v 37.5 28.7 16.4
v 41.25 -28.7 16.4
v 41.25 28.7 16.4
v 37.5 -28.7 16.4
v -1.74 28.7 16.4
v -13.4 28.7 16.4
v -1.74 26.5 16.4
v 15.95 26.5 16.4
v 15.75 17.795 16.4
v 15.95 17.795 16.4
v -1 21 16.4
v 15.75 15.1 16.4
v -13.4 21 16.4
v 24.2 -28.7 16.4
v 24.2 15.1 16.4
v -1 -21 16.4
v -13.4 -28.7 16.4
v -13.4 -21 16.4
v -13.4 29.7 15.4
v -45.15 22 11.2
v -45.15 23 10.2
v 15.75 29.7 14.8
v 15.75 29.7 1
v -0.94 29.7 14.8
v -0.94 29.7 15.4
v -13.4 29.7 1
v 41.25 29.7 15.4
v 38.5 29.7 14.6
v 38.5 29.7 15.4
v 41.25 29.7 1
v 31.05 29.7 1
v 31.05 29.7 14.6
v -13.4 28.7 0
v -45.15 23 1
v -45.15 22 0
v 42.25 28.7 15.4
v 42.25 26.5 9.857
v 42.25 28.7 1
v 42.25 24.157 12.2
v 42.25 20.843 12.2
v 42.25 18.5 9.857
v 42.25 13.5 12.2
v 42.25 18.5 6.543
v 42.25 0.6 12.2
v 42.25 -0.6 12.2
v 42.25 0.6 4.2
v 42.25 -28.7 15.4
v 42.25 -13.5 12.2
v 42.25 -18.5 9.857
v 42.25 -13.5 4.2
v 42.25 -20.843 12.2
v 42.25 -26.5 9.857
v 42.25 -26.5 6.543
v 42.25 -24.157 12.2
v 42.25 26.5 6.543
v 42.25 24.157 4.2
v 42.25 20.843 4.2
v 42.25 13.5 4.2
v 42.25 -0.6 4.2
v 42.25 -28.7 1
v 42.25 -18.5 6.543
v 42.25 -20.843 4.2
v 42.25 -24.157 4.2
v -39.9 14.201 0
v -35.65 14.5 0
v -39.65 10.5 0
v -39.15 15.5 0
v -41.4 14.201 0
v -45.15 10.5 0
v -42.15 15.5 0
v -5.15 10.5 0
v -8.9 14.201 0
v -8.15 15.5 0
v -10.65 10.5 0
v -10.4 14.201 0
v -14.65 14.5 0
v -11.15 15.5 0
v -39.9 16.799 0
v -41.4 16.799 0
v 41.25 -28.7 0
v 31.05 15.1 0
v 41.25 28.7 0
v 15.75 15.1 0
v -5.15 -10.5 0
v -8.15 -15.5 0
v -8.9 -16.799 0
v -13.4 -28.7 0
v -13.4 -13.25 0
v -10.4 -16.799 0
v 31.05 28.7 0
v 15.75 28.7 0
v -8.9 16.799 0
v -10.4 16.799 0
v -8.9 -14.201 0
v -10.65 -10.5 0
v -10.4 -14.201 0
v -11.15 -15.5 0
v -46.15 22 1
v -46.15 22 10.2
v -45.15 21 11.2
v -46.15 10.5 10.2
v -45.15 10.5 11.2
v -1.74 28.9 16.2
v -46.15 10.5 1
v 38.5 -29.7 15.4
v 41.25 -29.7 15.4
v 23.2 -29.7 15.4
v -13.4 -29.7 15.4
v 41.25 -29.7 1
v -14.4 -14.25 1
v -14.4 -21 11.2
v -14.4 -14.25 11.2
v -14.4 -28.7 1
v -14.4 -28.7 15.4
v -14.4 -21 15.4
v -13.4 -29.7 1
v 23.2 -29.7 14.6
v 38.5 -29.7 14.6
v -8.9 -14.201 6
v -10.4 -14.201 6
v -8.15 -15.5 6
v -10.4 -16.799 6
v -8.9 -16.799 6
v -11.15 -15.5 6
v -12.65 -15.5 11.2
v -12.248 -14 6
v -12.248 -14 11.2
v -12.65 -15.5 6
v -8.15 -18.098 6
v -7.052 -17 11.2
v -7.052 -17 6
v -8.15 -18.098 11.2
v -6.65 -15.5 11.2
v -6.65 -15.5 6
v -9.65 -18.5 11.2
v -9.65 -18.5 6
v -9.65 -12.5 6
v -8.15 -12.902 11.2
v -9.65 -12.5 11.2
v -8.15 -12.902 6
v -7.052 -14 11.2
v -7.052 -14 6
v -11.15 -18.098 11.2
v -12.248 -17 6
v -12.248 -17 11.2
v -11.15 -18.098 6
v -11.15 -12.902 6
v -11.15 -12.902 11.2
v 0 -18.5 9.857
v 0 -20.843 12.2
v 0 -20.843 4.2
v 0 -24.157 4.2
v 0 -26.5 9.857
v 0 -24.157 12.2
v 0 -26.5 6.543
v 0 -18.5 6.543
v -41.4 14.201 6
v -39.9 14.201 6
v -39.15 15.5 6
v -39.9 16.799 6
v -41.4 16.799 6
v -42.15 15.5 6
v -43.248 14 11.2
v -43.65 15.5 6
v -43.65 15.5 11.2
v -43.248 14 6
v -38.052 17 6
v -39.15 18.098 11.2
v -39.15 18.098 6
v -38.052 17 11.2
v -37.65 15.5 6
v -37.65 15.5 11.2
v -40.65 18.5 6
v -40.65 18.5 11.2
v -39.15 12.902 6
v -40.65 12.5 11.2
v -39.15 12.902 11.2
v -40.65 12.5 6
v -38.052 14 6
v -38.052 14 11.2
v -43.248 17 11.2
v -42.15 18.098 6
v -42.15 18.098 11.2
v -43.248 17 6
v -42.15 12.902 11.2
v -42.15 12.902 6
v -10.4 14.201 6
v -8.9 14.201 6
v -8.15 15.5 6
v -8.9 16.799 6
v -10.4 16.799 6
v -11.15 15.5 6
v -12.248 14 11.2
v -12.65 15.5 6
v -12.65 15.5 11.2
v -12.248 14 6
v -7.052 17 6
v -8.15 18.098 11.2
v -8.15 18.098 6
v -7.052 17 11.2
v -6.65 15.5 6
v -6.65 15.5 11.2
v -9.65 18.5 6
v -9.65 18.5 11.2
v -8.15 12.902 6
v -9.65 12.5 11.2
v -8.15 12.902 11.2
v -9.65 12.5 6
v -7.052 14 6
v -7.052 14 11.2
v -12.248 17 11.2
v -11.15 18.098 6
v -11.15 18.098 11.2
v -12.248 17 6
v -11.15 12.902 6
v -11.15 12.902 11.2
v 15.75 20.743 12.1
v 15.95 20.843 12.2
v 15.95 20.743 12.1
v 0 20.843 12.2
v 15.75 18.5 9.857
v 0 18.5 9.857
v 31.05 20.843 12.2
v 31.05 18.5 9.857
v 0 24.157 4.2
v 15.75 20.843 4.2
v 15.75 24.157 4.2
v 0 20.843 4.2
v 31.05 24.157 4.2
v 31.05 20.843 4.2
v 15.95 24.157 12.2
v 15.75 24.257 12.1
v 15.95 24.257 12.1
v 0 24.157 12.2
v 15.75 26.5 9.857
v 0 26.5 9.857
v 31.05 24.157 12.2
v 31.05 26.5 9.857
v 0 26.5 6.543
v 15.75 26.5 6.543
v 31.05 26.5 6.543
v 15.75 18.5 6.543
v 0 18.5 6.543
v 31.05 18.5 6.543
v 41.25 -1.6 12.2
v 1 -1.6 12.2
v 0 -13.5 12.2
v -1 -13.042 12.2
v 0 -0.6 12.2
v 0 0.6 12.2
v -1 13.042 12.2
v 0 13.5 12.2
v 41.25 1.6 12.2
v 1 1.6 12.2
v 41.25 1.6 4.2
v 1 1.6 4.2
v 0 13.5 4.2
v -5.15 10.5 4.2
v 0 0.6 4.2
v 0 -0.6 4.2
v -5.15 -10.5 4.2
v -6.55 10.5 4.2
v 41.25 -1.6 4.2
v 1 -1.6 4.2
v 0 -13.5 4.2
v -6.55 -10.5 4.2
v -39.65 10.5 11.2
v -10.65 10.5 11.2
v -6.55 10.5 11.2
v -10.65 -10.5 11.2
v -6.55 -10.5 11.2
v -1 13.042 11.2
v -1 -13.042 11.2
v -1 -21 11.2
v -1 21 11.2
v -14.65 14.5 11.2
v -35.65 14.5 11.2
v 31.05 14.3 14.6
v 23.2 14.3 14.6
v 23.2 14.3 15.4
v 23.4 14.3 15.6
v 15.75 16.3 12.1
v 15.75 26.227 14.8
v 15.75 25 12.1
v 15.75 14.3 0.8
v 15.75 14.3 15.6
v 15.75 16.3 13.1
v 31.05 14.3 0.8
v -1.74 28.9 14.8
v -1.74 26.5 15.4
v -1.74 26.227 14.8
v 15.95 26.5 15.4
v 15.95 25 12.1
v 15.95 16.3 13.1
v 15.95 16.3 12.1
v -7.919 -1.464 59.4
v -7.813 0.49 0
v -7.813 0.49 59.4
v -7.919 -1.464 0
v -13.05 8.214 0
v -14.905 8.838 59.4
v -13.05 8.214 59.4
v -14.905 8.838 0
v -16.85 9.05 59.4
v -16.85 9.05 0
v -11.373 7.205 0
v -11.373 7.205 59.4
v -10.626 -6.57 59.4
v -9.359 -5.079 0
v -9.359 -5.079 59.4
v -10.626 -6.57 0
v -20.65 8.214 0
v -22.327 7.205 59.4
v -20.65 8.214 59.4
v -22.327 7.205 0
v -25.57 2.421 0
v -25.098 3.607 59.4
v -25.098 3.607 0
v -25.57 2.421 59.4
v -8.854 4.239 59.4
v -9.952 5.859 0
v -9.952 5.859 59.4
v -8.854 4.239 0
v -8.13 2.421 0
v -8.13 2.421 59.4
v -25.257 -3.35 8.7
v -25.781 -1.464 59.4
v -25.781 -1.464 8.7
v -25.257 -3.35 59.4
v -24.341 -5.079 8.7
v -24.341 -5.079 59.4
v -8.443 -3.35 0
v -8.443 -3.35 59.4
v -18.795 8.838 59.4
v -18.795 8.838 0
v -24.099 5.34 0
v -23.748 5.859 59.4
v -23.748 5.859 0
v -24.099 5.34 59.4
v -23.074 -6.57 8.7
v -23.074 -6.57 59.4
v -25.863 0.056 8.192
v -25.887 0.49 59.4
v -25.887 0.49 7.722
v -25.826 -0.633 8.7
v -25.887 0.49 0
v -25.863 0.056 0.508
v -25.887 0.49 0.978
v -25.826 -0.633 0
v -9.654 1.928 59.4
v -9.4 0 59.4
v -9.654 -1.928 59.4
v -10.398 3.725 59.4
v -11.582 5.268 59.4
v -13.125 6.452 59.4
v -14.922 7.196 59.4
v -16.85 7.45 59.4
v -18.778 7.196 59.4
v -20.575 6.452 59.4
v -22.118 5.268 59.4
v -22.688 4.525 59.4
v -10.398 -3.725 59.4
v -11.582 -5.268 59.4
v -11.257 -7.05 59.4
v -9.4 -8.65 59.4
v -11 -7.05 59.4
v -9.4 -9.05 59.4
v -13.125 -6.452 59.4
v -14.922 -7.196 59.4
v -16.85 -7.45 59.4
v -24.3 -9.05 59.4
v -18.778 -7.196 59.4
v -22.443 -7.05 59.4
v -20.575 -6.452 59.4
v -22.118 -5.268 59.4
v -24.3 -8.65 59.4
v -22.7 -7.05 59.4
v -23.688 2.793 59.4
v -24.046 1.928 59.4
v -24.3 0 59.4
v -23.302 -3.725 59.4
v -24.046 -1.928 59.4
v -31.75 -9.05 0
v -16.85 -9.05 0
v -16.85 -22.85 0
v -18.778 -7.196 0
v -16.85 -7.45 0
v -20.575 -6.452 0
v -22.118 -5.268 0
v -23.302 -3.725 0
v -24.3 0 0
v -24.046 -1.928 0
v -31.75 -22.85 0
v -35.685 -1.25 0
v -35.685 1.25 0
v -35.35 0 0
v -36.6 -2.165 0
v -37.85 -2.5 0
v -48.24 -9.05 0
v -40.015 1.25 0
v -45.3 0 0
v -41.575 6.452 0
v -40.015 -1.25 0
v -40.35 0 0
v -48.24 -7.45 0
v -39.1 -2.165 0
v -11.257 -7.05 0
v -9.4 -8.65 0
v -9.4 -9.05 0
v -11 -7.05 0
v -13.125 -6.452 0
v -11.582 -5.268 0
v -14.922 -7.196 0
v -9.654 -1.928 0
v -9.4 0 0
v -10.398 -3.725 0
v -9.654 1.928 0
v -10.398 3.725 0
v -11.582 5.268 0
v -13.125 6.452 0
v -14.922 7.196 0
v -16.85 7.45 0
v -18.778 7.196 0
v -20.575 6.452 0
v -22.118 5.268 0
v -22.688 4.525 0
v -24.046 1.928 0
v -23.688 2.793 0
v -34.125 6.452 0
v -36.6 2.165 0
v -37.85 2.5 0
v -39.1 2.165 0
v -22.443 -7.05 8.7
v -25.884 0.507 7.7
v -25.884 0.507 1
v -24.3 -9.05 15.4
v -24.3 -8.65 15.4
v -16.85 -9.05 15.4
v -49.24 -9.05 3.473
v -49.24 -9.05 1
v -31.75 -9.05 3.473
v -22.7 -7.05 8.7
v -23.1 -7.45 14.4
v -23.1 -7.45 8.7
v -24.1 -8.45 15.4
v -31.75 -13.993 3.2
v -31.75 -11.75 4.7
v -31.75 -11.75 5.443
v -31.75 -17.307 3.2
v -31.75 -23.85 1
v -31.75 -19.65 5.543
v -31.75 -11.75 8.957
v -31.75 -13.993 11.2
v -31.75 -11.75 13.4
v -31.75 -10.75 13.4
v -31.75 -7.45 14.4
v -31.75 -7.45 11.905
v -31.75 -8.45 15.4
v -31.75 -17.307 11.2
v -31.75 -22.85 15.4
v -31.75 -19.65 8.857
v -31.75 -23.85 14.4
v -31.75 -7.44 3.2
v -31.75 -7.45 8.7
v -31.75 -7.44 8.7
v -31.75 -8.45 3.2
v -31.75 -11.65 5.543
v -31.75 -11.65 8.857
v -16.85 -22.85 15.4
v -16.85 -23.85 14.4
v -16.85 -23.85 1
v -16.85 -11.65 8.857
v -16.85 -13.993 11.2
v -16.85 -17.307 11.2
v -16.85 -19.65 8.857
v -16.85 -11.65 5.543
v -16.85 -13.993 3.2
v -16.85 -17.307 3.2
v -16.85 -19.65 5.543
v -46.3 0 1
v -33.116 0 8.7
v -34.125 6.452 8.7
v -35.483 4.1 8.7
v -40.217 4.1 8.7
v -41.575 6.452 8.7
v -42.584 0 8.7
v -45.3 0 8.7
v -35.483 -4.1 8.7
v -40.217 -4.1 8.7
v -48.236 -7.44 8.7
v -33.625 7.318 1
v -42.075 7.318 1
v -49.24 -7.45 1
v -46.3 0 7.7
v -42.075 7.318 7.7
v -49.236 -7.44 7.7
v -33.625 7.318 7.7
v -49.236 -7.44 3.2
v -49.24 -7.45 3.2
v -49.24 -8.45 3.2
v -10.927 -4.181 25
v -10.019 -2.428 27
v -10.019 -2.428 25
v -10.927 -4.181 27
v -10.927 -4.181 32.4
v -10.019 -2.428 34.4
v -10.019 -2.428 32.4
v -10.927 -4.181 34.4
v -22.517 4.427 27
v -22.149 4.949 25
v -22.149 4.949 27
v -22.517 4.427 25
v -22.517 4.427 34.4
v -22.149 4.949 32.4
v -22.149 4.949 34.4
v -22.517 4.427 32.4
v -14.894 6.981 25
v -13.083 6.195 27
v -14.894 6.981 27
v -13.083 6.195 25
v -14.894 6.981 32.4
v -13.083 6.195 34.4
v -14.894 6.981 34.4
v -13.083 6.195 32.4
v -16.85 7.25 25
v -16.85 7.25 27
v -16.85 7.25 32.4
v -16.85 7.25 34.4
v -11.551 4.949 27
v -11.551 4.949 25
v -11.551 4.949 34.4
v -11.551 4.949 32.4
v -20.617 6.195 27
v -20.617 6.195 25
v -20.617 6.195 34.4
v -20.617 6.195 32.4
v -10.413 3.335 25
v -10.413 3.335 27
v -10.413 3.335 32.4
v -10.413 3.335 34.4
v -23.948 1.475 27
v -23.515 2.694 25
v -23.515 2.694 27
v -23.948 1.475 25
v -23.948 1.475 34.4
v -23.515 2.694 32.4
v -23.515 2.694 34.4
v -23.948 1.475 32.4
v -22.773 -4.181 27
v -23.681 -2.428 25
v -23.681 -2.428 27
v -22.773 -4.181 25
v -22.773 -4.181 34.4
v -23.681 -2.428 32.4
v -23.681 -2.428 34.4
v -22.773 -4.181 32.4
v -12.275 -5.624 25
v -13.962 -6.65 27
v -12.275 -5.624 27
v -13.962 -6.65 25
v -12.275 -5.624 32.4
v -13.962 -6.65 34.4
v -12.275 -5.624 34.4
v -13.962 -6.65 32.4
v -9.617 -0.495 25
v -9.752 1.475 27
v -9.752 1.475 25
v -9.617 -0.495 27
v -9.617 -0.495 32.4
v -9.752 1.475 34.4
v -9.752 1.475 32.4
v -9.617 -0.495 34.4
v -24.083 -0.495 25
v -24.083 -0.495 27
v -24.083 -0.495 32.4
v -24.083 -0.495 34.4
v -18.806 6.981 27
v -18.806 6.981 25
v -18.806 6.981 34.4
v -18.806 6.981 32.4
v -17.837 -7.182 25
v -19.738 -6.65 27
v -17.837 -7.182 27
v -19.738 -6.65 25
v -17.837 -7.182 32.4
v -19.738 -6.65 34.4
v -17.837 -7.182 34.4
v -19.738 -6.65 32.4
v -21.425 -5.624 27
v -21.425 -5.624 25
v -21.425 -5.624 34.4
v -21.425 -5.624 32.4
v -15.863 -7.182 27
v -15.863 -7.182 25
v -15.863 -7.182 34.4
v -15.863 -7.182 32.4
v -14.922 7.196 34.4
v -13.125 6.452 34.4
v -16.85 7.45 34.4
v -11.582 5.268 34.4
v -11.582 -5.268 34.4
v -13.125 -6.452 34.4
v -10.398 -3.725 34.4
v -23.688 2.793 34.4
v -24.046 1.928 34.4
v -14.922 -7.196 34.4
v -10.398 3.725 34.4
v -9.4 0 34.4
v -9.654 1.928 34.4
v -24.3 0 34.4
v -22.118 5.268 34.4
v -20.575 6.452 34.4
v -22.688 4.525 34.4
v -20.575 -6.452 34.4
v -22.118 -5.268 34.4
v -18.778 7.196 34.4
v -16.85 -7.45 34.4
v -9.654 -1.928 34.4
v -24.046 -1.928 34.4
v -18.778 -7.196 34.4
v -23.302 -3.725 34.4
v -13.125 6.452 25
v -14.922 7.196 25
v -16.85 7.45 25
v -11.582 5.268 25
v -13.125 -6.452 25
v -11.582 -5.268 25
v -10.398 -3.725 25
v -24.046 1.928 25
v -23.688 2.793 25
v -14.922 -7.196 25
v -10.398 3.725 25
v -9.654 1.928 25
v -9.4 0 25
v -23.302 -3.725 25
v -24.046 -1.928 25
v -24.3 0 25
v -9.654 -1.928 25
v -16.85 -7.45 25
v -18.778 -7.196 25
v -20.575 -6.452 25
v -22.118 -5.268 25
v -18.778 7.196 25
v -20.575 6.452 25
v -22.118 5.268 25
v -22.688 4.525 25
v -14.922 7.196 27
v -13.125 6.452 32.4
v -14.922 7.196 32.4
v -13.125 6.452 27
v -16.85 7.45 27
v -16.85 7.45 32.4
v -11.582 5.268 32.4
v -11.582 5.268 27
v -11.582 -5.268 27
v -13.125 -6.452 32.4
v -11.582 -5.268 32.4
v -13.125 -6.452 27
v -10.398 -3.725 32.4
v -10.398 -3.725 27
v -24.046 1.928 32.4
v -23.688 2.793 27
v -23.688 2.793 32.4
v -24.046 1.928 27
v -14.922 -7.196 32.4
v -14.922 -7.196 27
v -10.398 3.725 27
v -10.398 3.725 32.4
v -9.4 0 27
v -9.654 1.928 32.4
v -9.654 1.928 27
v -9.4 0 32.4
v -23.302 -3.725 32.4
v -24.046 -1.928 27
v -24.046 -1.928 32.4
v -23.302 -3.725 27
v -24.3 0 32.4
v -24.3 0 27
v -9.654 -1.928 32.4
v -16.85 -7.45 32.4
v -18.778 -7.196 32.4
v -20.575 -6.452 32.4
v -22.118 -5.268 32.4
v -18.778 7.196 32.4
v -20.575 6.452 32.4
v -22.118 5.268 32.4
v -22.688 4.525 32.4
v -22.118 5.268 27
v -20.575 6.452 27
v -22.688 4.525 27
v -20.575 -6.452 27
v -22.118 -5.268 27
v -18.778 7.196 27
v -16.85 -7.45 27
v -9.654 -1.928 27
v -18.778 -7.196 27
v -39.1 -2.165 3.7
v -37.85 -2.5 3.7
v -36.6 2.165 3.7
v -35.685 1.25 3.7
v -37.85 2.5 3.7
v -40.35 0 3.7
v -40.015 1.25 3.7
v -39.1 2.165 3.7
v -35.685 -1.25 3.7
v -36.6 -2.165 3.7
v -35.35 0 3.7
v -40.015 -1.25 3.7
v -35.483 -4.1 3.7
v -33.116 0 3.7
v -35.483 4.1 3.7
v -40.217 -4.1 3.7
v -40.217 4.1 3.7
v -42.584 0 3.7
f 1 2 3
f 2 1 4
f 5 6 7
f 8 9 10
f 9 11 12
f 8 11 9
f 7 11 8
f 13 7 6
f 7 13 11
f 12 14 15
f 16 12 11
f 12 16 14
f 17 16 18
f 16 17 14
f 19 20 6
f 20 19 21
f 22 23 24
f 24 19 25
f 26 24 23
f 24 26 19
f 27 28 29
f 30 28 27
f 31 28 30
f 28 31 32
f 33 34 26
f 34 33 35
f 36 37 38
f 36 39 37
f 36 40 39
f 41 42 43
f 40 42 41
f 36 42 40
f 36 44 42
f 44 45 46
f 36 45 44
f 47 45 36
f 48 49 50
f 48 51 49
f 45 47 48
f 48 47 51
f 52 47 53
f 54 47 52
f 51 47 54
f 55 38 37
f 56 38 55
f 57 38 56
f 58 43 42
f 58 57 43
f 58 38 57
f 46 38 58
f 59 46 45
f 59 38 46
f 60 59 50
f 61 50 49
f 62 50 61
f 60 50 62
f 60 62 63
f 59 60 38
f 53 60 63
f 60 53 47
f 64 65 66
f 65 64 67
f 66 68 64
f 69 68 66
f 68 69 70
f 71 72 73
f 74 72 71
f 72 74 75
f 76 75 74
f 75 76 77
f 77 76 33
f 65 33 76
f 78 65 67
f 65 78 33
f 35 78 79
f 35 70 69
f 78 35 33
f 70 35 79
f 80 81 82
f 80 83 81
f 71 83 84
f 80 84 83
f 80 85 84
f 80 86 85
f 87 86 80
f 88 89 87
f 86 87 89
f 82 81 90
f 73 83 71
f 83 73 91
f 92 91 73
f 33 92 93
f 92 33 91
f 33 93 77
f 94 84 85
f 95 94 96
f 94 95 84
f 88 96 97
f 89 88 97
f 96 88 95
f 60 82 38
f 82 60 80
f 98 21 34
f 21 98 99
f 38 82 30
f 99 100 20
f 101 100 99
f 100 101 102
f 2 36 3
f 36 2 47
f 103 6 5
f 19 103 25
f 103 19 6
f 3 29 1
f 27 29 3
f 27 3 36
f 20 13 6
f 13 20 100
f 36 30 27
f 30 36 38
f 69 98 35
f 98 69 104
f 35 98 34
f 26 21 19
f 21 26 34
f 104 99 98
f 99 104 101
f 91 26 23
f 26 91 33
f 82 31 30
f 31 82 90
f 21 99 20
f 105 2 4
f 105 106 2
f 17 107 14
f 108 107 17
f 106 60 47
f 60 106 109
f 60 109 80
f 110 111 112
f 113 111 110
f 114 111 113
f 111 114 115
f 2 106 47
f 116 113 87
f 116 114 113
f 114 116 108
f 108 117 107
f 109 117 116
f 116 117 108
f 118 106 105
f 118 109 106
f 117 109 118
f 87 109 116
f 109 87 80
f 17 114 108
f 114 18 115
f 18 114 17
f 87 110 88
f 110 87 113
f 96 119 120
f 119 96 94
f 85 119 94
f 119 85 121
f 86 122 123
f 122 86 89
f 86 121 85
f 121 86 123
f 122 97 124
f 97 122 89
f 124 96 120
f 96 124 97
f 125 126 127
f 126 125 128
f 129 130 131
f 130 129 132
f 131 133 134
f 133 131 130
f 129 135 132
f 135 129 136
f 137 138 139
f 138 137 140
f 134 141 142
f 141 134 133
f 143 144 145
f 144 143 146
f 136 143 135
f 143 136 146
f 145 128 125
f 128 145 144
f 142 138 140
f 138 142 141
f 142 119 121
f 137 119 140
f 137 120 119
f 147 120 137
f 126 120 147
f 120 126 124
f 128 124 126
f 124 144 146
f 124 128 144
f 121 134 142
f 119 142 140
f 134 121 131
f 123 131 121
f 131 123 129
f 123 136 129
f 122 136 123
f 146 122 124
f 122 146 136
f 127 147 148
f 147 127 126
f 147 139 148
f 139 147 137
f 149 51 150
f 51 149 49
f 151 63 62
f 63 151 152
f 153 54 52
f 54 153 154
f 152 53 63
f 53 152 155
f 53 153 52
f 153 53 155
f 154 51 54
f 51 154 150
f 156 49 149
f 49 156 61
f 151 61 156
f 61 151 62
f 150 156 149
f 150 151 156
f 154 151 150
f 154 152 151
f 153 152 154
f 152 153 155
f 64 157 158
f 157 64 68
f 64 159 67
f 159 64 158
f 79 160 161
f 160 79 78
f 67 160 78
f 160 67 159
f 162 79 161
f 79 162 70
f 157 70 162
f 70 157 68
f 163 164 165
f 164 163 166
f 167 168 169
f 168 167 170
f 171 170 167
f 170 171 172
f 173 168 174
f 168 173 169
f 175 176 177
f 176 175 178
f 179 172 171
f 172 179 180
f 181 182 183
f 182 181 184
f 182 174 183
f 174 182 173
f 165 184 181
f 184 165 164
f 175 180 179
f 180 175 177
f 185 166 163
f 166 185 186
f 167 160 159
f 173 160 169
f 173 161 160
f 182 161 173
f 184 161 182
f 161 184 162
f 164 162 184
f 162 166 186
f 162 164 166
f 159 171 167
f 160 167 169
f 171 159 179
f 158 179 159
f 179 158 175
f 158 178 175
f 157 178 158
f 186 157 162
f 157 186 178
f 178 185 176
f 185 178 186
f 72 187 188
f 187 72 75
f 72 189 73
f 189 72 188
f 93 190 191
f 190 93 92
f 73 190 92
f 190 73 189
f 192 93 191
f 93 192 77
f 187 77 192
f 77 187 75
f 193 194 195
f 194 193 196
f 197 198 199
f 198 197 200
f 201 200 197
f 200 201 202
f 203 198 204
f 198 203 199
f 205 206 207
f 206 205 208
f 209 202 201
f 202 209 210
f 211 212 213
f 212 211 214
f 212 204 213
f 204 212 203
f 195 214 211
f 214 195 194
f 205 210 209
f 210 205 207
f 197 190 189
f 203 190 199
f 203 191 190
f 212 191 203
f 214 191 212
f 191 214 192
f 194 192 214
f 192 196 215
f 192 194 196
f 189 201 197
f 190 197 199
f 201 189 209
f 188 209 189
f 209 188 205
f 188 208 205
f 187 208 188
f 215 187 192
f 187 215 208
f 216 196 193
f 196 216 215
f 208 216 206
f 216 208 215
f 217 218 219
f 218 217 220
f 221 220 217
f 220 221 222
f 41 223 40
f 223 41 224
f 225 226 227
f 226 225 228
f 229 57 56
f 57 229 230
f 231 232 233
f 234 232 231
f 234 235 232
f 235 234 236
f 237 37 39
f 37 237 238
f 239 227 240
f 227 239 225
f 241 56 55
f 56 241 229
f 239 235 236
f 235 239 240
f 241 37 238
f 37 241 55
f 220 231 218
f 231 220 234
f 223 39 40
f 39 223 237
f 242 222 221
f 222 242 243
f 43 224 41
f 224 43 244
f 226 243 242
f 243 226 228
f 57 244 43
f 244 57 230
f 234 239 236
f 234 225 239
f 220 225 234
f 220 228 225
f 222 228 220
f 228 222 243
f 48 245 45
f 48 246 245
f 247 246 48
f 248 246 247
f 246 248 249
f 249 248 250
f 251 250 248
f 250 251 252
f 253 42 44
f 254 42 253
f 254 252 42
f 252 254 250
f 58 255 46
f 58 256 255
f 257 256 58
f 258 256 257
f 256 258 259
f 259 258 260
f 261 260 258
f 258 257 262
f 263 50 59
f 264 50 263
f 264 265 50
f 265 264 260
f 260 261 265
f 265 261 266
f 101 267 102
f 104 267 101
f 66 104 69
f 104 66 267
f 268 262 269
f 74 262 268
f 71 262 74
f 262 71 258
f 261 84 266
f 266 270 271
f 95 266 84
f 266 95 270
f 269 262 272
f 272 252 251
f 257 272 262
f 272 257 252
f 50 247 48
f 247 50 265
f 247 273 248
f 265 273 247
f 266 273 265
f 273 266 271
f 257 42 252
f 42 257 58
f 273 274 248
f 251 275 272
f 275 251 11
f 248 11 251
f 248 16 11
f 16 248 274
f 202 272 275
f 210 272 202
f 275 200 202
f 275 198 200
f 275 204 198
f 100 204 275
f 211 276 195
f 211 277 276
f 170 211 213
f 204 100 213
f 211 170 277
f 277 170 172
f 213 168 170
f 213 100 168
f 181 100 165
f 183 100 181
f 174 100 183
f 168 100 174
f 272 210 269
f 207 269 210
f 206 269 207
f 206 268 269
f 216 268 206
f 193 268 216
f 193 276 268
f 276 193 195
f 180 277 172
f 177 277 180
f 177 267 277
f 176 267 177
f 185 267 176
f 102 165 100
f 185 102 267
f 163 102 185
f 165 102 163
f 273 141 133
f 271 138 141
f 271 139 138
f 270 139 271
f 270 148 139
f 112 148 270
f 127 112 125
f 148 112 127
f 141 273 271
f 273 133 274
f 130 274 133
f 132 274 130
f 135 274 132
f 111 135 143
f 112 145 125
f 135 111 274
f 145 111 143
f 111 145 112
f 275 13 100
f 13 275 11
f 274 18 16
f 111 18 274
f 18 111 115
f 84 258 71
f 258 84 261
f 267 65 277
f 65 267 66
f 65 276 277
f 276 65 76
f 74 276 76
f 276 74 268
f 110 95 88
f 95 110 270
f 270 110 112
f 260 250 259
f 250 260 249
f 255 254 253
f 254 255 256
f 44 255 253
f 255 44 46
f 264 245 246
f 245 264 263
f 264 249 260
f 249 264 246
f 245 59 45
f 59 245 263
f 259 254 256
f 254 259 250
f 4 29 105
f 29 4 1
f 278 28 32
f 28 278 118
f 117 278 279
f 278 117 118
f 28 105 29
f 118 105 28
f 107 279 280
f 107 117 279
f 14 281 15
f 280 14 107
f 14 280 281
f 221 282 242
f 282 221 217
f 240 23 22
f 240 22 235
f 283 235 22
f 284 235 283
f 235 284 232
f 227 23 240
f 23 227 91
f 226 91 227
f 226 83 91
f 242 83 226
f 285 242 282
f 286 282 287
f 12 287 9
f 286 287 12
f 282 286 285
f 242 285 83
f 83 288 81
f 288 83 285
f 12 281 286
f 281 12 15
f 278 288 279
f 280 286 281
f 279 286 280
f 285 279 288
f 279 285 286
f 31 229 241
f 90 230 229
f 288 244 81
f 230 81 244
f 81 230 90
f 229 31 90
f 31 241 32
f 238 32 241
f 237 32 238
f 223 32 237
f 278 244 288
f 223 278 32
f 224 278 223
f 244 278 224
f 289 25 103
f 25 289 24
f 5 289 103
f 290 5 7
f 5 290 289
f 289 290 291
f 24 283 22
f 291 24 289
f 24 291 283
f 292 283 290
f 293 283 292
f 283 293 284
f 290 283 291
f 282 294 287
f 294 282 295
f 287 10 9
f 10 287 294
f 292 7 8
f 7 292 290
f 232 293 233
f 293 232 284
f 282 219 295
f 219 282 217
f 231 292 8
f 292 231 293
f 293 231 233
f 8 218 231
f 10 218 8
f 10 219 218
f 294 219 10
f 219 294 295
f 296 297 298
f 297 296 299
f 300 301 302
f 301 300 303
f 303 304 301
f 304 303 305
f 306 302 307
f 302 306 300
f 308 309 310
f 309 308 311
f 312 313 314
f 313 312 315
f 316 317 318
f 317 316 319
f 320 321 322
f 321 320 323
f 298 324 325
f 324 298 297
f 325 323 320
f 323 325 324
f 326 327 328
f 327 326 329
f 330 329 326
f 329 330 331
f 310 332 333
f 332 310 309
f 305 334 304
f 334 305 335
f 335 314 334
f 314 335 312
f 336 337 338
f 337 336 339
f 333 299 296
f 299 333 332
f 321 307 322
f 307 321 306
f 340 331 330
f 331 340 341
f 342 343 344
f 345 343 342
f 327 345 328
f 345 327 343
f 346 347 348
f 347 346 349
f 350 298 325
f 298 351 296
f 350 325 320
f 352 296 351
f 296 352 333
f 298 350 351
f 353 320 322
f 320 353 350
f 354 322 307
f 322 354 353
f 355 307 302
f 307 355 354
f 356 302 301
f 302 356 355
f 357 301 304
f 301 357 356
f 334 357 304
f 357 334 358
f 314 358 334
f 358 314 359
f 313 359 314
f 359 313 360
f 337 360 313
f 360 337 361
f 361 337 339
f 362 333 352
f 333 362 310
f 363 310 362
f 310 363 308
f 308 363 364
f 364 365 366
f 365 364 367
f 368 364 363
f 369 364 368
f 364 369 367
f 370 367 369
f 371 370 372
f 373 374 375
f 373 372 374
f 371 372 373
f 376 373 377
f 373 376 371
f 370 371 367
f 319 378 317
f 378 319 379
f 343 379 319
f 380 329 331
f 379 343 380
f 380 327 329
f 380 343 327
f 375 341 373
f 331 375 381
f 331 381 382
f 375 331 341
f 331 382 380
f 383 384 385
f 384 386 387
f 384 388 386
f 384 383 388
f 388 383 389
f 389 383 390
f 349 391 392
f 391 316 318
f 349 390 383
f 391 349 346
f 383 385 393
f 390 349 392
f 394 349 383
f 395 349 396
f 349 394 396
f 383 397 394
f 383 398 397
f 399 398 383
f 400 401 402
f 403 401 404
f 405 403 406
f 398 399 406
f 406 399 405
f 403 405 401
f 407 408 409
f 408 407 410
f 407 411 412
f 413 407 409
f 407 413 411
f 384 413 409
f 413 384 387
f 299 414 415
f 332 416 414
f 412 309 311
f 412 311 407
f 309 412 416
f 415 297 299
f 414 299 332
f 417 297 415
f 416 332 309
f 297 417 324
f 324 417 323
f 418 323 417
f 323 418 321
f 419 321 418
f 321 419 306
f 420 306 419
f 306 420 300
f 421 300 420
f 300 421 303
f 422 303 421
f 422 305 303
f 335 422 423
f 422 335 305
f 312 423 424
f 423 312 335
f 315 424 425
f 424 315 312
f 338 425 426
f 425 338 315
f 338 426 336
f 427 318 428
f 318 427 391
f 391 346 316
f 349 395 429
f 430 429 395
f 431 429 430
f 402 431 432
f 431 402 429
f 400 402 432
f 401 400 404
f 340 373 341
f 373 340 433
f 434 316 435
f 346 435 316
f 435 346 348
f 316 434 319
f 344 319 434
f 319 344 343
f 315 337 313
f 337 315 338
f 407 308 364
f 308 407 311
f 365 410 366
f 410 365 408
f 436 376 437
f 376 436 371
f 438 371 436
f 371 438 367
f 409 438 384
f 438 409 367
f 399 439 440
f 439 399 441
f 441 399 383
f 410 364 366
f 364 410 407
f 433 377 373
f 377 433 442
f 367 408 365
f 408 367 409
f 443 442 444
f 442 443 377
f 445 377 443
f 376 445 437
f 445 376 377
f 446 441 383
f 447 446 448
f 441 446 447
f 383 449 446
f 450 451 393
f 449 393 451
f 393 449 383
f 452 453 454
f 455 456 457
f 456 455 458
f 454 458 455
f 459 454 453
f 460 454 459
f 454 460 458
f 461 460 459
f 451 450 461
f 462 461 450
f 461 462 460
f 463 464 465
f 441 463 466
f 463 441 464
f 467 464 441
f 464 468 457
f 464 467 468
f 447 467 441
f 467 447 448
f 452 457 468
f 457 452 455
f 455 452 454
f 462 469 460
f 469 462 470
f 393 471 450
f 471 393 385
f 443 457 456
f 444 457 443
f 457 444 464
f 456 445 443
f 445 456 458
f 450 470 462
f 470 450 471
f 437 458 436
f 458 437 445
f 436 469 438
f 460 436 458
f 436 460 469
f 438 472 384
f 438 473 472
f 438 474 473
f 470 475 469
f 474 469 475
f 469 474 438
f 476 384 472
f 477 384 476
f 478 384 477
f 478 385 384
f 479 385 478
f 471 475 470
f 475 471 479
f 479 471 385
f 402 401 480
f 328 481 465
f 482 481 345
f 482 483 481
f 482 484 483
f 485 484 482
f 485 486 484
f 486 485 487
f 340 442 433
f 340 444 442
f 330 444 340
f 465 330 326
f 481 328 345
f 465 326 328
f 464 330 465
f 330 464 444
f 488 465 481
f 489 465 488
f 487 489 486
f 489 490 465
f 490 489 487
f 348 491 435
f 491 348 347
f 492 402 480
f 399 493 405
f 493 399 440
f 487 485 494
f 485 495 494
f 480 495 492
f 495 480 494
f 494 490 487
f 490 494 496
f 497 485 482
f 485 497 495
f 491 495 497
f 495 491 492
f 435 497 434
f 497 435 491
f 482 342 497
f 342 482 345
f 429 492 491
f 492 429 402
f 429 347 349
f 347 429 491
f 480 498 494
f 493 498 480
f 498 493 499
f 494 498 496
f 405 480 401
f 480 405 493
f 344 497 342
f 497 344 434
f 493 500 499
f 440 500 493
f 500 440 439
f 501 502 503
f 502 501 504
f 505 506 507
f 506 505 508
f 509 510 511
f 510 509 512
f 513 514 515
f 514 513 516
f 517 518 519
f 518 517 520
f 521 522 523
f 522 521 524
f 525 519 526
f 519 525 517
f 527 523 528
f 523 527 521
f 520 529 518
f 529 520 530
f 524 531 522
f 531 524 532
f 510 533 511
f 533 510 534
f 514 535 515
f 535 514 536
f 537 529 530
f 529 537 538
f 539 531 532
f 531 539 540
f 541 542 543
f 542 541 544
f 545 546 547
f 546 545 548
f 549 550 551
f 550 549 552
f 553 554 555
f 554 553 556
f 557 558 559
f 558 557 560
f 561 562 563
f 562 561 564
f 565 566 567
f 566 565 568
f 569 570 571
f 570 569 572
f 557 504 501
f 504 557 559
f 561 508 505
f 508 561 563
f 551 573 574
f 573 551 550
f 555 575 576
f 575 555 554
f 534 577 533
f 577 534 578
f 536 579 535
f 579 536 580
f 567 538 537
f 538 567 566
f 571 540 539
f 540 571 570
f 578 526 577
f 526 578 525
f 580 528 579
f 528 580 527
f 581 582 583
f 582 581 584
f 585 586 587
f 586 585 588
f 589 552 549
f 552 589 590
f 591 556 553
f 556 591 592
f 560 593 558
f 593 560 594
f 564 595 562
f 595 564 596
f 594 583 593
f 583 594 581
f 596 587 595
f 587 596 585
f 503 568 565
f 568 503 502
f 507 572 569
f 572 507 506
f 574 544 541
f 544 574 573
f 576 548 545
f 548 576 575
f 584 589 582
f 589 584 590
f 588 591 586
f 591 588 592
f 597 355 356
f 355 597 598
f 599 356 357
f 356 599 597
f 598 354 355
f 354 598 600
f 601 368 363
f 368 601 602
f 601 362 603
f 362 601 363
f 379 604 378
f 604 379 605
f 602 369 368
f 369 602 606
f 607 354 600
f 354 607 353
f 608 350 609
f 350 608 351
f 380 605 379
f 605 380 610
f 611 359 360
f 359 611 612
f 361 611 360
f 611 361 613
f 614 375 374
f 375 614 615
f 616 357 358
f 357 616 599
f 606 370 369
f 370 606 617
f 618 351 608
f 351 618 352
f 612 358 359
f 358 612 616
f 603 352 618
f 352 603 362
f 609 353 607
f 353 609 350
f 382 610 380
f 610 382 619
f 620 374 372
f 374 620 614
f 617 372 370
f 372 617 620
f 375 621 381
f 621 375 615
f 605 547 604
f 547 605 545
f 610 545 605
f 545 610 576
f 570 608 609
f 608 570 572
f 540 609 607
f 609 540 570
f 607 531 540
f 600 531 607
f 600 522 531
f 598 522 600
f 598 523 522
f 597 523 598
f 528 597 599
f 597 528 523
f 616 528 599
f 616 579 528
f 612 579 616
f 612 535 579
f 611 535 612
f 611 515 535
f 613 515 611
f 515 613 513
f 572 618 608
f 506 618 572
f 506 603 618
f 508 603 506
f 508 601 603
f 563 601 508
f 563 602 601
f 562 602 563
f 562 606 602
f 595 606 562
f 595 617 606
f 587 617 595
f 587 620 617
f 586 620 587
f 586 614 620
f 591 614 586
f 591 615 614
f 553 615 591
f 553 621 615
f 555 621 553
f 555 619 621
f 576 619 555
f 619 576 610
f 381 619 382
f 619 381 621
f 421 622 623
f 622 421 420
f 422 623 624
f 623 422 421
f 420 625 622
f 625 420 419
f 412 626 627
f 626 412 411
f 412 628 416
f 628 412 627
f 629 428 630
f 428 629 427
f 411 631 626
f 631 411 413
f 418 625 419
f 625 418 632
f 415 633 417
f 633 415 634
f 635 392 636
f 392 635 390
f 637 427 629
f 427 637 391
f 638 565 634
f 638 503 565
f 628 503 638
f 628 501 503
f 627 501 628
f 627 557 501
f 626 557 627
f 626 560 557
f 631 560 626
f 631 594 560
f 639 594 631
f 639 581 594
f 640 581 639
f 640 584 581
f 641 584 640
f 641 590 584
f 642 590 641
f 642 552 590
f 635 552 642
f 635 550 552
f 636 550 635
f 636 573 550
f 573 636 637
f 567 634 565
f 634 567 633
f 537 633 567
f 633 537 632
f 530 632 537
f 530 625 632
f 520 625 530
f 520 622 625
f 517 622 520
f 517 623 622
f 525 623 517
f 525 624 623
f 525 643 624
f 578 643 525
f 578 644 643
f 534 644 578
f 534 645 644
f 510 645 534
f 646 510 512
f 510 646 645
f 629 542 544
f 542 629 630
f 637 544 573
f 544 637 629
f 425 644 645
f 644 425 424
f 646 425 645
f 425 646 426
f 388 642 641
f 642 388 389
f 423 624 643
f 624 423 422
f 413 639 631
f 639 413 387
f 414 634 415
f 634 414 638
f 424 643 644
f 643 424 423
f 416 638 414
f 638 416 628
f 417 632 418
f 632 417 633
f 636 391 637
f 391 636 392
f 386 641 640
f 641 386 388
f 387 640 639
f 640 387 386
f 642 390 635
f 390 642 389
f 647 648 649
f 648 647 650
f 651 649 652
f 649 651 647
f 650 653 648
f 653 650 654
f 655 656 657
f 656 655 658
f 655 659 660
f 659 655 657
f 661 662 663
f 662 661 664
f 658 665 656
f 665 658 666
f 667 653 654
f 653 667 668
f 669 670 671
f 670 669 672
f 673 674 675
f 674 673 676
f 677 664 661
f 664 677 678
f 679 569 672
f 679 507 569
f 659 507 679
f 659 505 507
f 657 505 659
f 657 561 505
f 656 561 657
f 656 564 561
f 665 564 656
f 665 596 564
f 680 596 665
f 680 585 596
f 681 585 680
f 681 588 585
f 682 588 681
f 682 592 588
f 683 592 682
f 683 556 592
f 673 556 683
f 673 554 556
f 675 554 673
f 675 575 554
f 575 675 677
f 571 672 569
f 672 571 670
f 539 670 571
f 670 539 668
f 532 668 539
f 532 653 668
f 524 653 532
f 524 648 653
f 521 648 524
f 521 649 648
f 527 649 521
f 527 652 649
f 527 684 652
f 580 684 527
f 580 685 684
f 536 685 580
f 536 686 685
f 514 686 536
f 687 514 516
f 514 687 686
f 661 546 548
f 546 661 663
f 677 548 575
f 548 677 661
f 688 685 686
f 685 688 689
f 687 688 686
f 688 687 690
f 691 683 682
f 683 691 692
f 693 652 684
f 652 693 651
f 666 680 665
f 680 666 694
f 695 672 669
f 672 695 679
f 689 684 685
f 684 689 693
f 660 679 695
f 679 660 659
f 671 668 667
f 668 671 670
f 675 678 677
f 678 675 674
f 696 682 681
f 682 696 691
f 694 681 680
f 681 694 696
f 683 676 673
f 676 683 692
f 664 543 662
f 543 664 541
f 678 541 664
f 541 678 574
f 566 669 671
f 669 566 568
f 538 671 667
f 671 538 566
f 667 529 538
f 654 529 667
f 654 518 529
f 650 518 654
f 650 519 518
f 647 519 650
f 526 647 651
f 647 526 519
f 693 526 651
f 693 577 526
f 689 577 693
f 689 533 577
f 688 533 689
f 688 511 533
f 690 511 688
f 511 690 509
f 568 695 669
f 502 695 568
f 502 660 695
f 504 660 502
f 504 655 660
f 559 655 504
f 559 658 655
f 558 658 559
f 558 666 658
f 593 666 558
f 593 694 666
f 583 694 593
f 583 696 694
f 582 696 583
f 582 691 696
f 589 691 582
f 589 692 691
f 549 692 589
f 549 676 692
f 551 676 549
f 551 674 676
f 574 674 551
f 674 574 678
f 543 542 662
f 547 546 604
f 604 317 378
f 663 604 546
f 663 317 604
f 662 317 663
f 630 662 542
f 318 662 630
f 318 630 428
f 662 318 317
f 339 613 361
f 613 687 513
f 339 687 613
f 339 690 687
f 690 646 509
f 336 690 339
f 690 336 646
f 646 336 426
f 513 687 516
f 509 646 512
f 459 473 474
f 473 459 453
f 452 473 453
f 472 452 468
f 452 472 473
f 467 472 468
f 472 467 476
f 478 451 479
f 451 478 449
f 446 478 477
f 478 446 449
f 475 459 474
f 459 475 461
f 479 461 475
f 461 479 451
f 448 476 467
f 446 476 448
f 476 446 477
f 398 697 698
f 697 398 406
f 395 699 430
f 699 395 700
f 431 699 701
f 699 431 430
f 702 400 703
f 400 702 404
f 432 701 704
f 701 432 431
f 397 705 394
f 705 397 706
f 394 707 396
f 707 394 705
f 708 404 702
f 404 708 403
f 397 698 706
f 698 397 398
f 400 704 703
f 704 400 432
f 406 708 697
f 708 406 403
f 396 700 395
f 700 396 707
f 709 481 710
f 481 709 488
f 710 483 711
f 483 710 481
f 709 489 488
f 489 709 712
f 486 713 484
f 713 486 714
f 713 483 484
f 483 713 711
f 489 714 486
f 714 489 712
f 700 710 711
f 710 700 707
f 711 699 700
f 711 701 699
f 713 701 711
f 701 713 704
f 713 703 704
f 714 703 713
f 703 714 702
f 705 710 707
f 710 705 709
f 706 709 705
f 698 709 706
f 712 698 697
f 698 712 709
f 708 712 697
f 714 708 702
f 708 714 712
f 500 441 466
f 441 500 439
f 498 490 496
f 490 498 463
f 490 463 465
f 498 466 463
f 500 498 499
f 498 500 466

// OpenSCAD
//////////////////////////////////////////////////////////////////////////////////////
///
///  I3XENDS - Split X-Ends for Prusa i3, with Endstop and Belt Tensioner
///
///  This file contains a redesign of the X-ends for the Prusa i3, including
///  motor end, idler end with belt tensioner and endstop.
///
///  The design goal is to make the X-ends stronger by splitting them into two
///  interlocking parts, printing the Z-axis related part vertically and the
///  X-axis relating part rotated 90 degrees to the back.  This way, each part
///  is printed in its optimal position, resulting in improved object strength
///  and reduced printing difficulties, such as warping and cracking. The two
///  part are joined by means of a trapezoidal slide and are locked firmly
///  together once the upped X-rod is inserted.
///
///  The idler bearing is mounted on a configurable fork which also acts as a
///  belt tensioner, being attached to the left X-end by means of an ajuster bolt.
///  Idler forks for the following bearing are predefined:
///     2x623ZZ, 2x604ZZ, 2x624Z, 2x625ZZ, 1x608ZZ
///
///  The motor X-end contains has the option for integrating a Z-endstop adjustment
///  screw.
///
///  Finally, the X-endstop holder is implemented a separate object which slides
///  on boths X-rods and is maintained firmly in its position bt means of two locking
///  screws.
///
///  The rod channels and screw holes are defined to be tight.  Use a drill with
///  the corresponding diameter to obtain perfectly fitting cavities.
///
//////////////////////////////////////////////////////////////////////////////////////
///
///  2014-10-24 Heinz Spiess, Switzerland
///
///  released under Creative Commons - Attribution - Share Alike licence (CC BY-SA)
//////////////////////////////////////////////////////////////////////////////////////

// extrusion specific parameters
ew = 0.4;    // extrusion width
eh = 0.3;    // layer height
epsgap = 0.2; // gap between complementing parts
wall = [6*ew, 8*ew, 14*eh, 4*ew]; // wall thickness x/y/z/lm8uu


// build a cube with chamfered edges
module chamfered_cube(size,d=[1,1,1]){
   hull(){
     translate([d[0],d[1],0])cube(size-2*[d[0],d[1],0]);
     translate([0,d[1],d[2]])cube(size-2*[0,d[1],d[2]]);
     translate([d[0],0,d[2]])cube(size-2*[d[0],0,d[2]]);
   }
}


// build a cylinder with chamfered edges
module chamfered_cylinder(r=0,r1=0,r2=0,h=0,d=1){
   hull(){
      translate([0,0,d])cylinder(r1=(r?r:r1),r2=(r>0?r:r2),h=h-2*d);
      cylinder(r1=(r?r:r1)-d,r2=(r>0?r:r2)-d,h=h);
   }
}


//////////////////////////////////////////////////////////////////////////////////////
///
///  The module i3_xend() contains all parts of the project as sub-modules. 
///  (This is convenient since this way, the parameters can easily be shared.)
///
//////////////////////////////////////////////////////////////////////////////////////
module i3_xend(
   motorend=true, 
   idlerend=false, 
   idler=false, 
   bearing=[5,17,11],
   endstop=false,
   zcarriage=true,
   support=true,
   idlerclamps=false,
   zclamps=false,
   xdist=45,       // distance between x-rods
   xrod=8,        // diameter of x-rods
   zsrod = 8,     // diameter of smooth z-rod
   ztrod=[5,8.2,5],// [diameter, nut_width, nut_height] of threaded z-rod
   ){
lm8uu = 14.9; // diameter of linear bearing;
lm8uuh = 25;  // length of linear bearing;
motor_d = 42; // motor side length (Nema 17)
motor_s = 31; // motor mounting screws spacing

madj = 2.5;   // screw hole for adjuster screw (cut thread with M3 tap)
m3 = 3;       // motor screw diameter
m3n = 5.5;    // M3 nut diameter
m3nh = 2.5;   // M3 nut height
zdist = motor_d/2-(zsrod/2)+4; // center-to-center distance between z-rods


idl = 20;     // idler length
idg = 0.25;   // gap for idler
ids = m3;      // idler tensioning screw diameter
idn = m3n;    // idler nut diameter
idnh = m3nh;   // idler nut height

xgap = 10-wall[0]-(lm8uu-xrod)/2;    // gap between x-motor and wall

esl = 15;     // endstop length (along x-rods)
esd = 9.5;    // endstop switch screw distance

//  don't change the following, they are just to make code more readble
ml1 = motor_d+xgap;                    // upper length of motor end left of origin
ml2 = lm8uu/2+2*wall[0]+zdist+ztrod[0]+4;      // length of motor end right of origin
ml3 = motor_d/2-motor_s/4-m3+xgap;      // lower length of motor end left of origin
mlz = wall[0]+lm8uu/2;                  // x-position of smooth z-rod
d1 = 2*wall[2]+xrod;                    // height of main body
d2 = wall[2]+xrod-1;                    // height of motor base
h1 = xdist+2*wall[1]+xrod;              // total height

itl = ml2-idl-2*wall[0];                // idler tail length
idh = d1;     // idler height
ith = d1;                               // idler tail height
idd = d1;   // idler depth
idc = d1-1;
idca = -45;


///////////////////////////////////////////////////////////////////////////////
// local module for the interlocking Z-carriage part for motor and idler end
///////////////////////////////////////////////////////////////////////////////
module zcarriage(hole=true,l=h1,eps=0){
   assign(hh=min(h1/2-motor_d/2,10))
   scale([1,-1,1])translate([0,zdist,-eps])difference(){
      union(){
         // outer cylinder for linear bearing holder
         cylinder(r=lm8uu/2+wall[3]+eps,h=l+2*eps);
	 if(zclamps)
	 for(z=[lm8uuh/2+m3,l-lm8uuh/2-m3]) rotate(210+90)
	      translate([lm8uu/2+wall[3]-2,-wall[3]-1,z])
	          rotate([-90,0,0])rotate(-18)for(zz=[0,wall[3]+2])
		     translate([0,0,zz])
		        cylinder(r=m3+2*wall[3]+1,h=wall[3],$fn=70);
	 // locking rail
         hull(){
            translate([-lm8uu/2-wall[3]-eps,-lm8uu/2-eps,0])cube([ew+2*eps,lm8uu+2*eps,l+2*eps]);
            translate([-lm8uu/2-eps,-lm8uu/2+wall[3]-eps,0])cube([ew+2*eps,lm8uu-2*wall[3]+2*eps,l+2*eps]);
         }
	 // upper x-rod lock
         translate([-lm8uu/2-d1-eps,-lm8uu-eps,0-eps])chamfered_cube([d1+2*eps,lm8uu+2*eps,d1-1+2*eps],[1,0,1]);
	 // nut holder for threaded z-rod
	 hull(){
	   translate([0,-zdist,0])rotate(30)chamfered_cylinder(r=lm8uu/2+1,h=hh,$fn=6);
	   translate([-lm8uu/2-wall[3],-ml2+mlz-eps+0.01,0])chamfered_cube([wall[3],ml2-mlz+2*eps,hh],[0,1,1]);
	 }
      }
      // lock for nut holder
      hull(){
         translate([-lm8uu/2-wall[2]-0.1,-ml2+mlz,wall[2]+0.5+eps])cube([1,ml2-mlz-lm8uu,hh],[0,1,1]);
         translate([-lm8uu/2-1,-ml2+mlz-1,wall[2]-1+eps])cube([1.01,ml2-mlz-lm8uu+1,hh],[0,1,1]);
      }
      // cavities
      if(hole){
         // cavity for linear bearings
         translate([0,0,-1])cylinder(r=lm8uu/2-ew/2,h=l+2);
	 // upper linear bearing
         translate([0,0,l-lm8uuh])cylinder(r=lm8uu/2,h=lm8uuh+1);
	 // lower linear bearing
         translate([0,0,-1])cylinder(r=lm8uu/2,h=lm8uuh+1);
	 // middle part
	 if(2*lm8uu<l-7)
            translate([0,0,lm8uuh+2])cylinder(r=lm8uu/2,h=l-2*lm8uuh-4);
	 // longitudinal cutout to allow flexing
         rotate(210)translate([-1,0,-1])cube([2,lm8uu/2+wall[3]+0.1,l+2]);
	 if(zclamps)
	 for(z=[lm8uuh/2+m3,l-lm8uuh/2-m3]) rotate(210+90)
	      translate([lm8uu/2+m3+wall[3]-0.5,-wall[3]-2,z])
	          rotate([-90,0,0])rotate(30)for(zz=[0,wall[3]+2])
		        cylinder(r=m3/2,h=2*wall[3]+2+2,$fn=6);
	 // x-rod hole throu x-rod lock
         translate([-lm8uu/2-d1/2,1,wall[1]+xrod/2])rotate([90,0,0])rotate(22.5)cylinder(r=xrod/2/cos(22.5),h=lm8uu+2,$fn=8);
	 // hole for threaded z-rod
	 //%color("grey")translate([0,-zdist,-1])cylinder(r=ztrod[0]/2,h=h1+2,$fn=12);
	 translate([0,-zdist,-1])cylinder(r=ztrod[0]/2,h=h1/2-motor_d/2+2,$fn=12);
	 // nut cavity for threaded z-rod
	 translate([0,-zdist,hh-ztrod[2]])rotate(30)cylinder(r=ztrod[1]/2/cos(30),h=ztrod[2]+1,$fn=6);
      }
   }
}


///////////////////////////////////////////////////////////////////////////////
// local module to build the base of the motor end
///////////////////////////////////////////////////////////////////////////////
module motorend(){
difference(){
union(){
difference(){
   union(){
      // main body upper part
      hull(){
         translate([-ml1,-1,0])
            chamfered_cube([ml1+ml2,min(motor_d/2+3,h1/2+1),d2]);
         translate([-ml3,-1,0])
            chamfered_cube([ml3+ml2,h1/2+1,d1]);
      }
      // main body lower part
      translate([-ml3,-h1/2,0])
         chamfered_cube([ml3+ml2,h1/2+2,d1]);
      // z-adjuster screw base
      if(endstop)
         hull()for(xz=[[0,d1/2,6],[0,d1+lm8uu/2,36],[10,d1-5,6]])
            translate([-motor_d/2-xgap+motor_s/2+xz[0],-h1/2,xz[1]])rotate([-90,0,0])
               chamfered_cylinder(r=motor_s/2-motor_s/4-m3,h=min(h1/2-motor_d/2,xrod+wall[1]),$fn=xz[2]);
               //chamfered_cylinder(r=motor_s/2-motor_s/4-m3,h=h1/2-motor_d/2,$fn=xz[2]);

   }

   for(sy=[-1,1])scale([1,sy,1]){
      // x-rod holes
      translate([0,xdist/2,d1/2])rotate([0,90,0])rotate(22.5)cylinder(r=xrod/2/cos(22.5),h=ml2+1,$fn=8);
      // holes for motor screws
      for(fx=[-1,1])translate([-xgap-motor_d/2+fx*motor_s/2,motor_s/2,-1]){
         // main screw holes
         cylinder(r=m3/2,h=d2+1,$fn=6);
         // cavities for screw heads
	 translate([0,0,7]) cylinder(r=m3,h=d1+2,$fn=12);
      }
   }
   
   // main belt channel 
   translate([-motor_d-xgap-1,-motor_d/4,wall[2]])
      cube([motor_d+xgap+ml2+2,motor_d/2,xrod]);
   translate([0,0,0])hull(){
      translate([-xgap-wall[0],-motor_d/4,wall[2]])
         cube([xgap+ml2+2,motor_d/2,xrod]);
      translate([0,-motor_s/2+2,wall[2]])
         cube([ml2+2,motor_s-4,xrod]);
   }
   for(sy=[-1,1])scale([1,sy,1])
      translate([0,-xdist/2+xrod/2+wall[1],wall[2]])
         cube([ml2+2,xdist/2-xrod/2-wall[1]-motor_s/2,xrod]);
   // upper motor cavity
   translate([-motor_d-xgap-1,-motor_d/2,d2])
      cube([motor_d+xgap,motor_d,wall[2]+2]);
   //main cutout for motor
   translate([-motor_d-xgap-1,-motor_d/4,-1])
      cube([motor_d,motor_d/2,wall[2]+xrod+2]);
   // octogonal cutout centered on motor axis
   translate([-xgap-motor_d/2,0,0])hull()for(a=[0,90])rotate(a)
      cube([motor_d/2,motor_s-2,motor_d],true);

    // Z-adjuster screw hole
    if(endstop)
       translate([-motor_d/2-xgap+motor_s/2,-h1/2,d1+lm8uu/2])rotate([-90,0,0])
          translate([0,0,-1])cylinder(r=madj/2,h=h1/2+wall[1]-motor_d/2+2,$fn=6);
}
 
    // belt separating wall 
    translate([0,-wall[1]/2,0])chamfered_cube([ml2,wall[1],d1]);
}
   // cutout for linear bearings holder
    translate([wall[0]+lm8uu/2,h1/2,d1+lm8uu/2])rotate([90,0,0])
       rotate(90){
          zcarriage(hole=false,eps=epsgap);
          if(!support)%color("cyan")zcarriage(hole=true);
       }

}

    if(zcarriage)translate([-motor_d+xgap,0,0])rotate(90)
       zcarriage(hole=true);
}

///////////////////////////////////////////////////////////////////////////////
// local module to build the idler fork for the specified bearing parameters
//    bearing[0]   inner diameter (axis)
//    bearing[1]   outer diameter (incl. belt)
//    bearing[2]   width of bearing (incl. washers)
///////////////////////////////////////////////////////////////////////////////
module idler(){
   assign(idD = bearing[2]+2*wall[2])
   assign(idE = bearing[1]/2)
   difference(){
      union(){
         // main body
	 hull(){
            translate([0,-idd/2,0])chamfered_cube([idl,idd,idh]);
            translate([-idE-2,-idD/2,0])chamfered_cube([idl/2+idE,idD,idh]);
	    // front end
            translate([-idE+1,-idD/2,idh/2])rotate([-90,0,0])rotate(0)chamfered_cylinder(r=idh/2,h=idD);
	 }
	 // tail
         translate([0,-idd/2+wall[2]+epsgap,0])chamfered_cube([ml2-2*wall[0],idd-2*wall[2]-2*epsgap,idh]);
      }
      // hole tensioning screw
      translate([-1,0,d1/2])rotate([0,90,0])rotate(30)cylinder(r=ids/2,h=ml2+2,$fn=6);
      // axis hole
      translate([-idE+bearing[0]/2,-idD/2-1,d1/2])rotate([-90,0,0])cylinder(r=bearing[0]/2,h=idD+2);
      hull(){
         // bearing cavity 
         translate([-idE+2,-bearing[2]/2,d1/2])rotate([-90,0,0])cylinder(r=max(bearing[1],idh/cos(30)+2)/2,h=bearing[2]);
         // main cavity
         translate([-idd-1,-idd/2+wall[1],-1])chamfered_cube([idd+idl-wall[0]+1,idd-2*wall[1],idh+2]);
      }
      // tensioning nut cage
      hull()for(y=[0,xrod])translate([(idl+ml2-3*wall[1])/2,y,d1/2])rotate([0,90,0])
         rotate(30)cylinder(r=idn/2/cos(30)+(y?0.4:0),h=idnh,$fn=6);
   }
     
}

///////////////////////////////////////////////////////////////////////////////
// local module to build the idler X-end
///////////////////////////////////////////////////////////////////////////////
module idlerend(){
   difference(){
      union(){
         // main body
         translate([0,-h1/2,0]) chamfered_cube([ml2,h1,d1]);
	 // idler clamp screws
	 if(idlerclamps)for(sy=[-1,1])scale([1,sy,1]){
	     translate([ml2-idc/2,-xdist/2,d1/2])rotate([idca,0,0])chamfered_cylinder(r=idc/2,h=d1/2+m3nh+wall[2],d=2,$fn=36);
	 }
      }
   
      for(sy=[-1,1])scale([1,sy,1]){
         // x-rod holes
         translate([-1,xdist/2,d1/2])rotate([0,90,0])rotate(22.5)cylinder(r=xrod/2/cos(22.5),h=ml2+2,$fn=8);
      }
      
      // idler clamp screw
      if(idlerclamps)for(sy=[-1,1])scale([1,sy,1])
         translate([ml2-idc/2,-xdist/2,d1/2])rotate([idca,0,0]){
           // idler clamp screw head cavity (if needed)
	   cylinder(r=m3/2,h=d1/2+m3nh+wall[2]+3,$fn=6);
           // idler clamp screw holes
	   translate([0,0,d1/2+m3nh+wall[2]+0.01])cylinder(r=m3,h=d1/2+m3nh+wall[2]+3,$fn=12);
           // idler clamp screw nut traps
	   hull()for(x=[0,idc/2+.1])translate([x,0,xrod/2+wall[2]-1-epsgap/2])
	      cylinder(r=m3n/2+(x?0.35:epsgap),h=m3nh+epsgap,$fn=6);
      }
      // main belt channel 
      translate([-1,-motor_s/2+(idlerclamps?3.5:2),wall[2]-eh])
         cube([ml2+2,motor_s-(idlerclamps?7:4),xrod+eh]);
      translate([-1,-xdist/2+xrod/2+wall[1]+(idlerclamps?3.5:2),wall[2]-eh])
         cube([ml2+2,xdist-xrod-2*wall[1]-(idlerclamps?7:4),xrod+eh]);
   
      // idler cut-out
      translate([ml2-idl-idg,-idh/2-idg,-0.01])chamfered_cube([idl+10,idh+2*idg,d1+0.02],[1,0,1]);
   
 
      // cutout for linear bearings holder
      translate([wall[0]+lm8uu/2,h1/2,d1+lm8uu/2])rotate([90,0,0])
         rotate(90){
            zcarriage(hole=false,eps=epsgap);
            if(!support)%color("cyan")zcarriage(hole=true);
         }

   }
   // idler support structure (cut away after printing!)
   if(support)color("red")difference(){
      union(){
         translate([ml2-idl-2,-idh/2-2,d1-wall[2]])cube([idl+2,idh+4,eh]);
         translate([ml2-idl+1,-idh/2+1,0])cube([idl-1,idh-2,d1-wall[2]]);
      }
      translate([ml2-idl+1+2,-idh/2+1+2,-1])cube([idl-1,idh-2-4,d1-wall[2]+2]);
   }else{  // draw idler
      %color("green")translate([ml2+5,idd/2,idh/2])rotate([90,0,0])rotate(180)idler();
   }

   // tail cage for idler fork
   difference(){
      translate([0,-ith/2-wall[1]+(idlerclamps?1:0),wall[2]-eh-0.01])cube([ml2-idl,ith+2*wall[1]-(idlerclamps?2:0),xrod+eh+0.02]);
      translate([2*wall[0],-ith/2-idg,wall[2]])cube([ml2-idl-2*wall[0]+1,ith+2*idg,xrod]);
      translate([-1,0,d1/2])rotate([0,90,0])cylinder(r=ids/2,h=2*wall[0]+2);
   }

    
   // build separate interlocking z-carriage part
   if(zcarriage)translate([-2*lm8uu-2,h1/3,0]) rotate(90)zcarriage(hole=true);
}

///////////////////////////////////////////////////////////////////////////////
// local module to build the X-endstop
///////////////////////////////////////////////////////////////////////////////
module endstop(){
   rotate([0,support?0:180,0])translate([0,0,support?0:-(d1+m3nh+wall[2])])
   difference(){
      union(){
         // main body upper part
         translate([0,-h1/2,0]) chamfered_cube([esl,h1,d1+m3nh+wall[2]]);
      }

      for(sy=[-1,1])scale([1,sy,1]){
         // x-rod holes
         translate([-1,xdist/2,d1/2])rotate([0,90,0])
            rotate(22.5)cylinder(r=xrod/2/cos(22.5),h=esl+2,$fn=8);
         // x-rod nut cavities
         hull()for(x=[0,esl/2])translate([x,xdist/2,d1-1])
            rotate(30)cylinder(r=m3n/2/cos(30)+(x?0.2:0),h=m3nh,$fn=6);
         // x-rod clamping screw holes - lower part
         translate([esl/2,xdist/2,d1-wall[2]])cylinder(r=m3/2,h=wall[2],$fn=6);
         // x-rod clamping screw holes - upper part
         translate([esl/2,xdist/2,d1+m3nh-1+eh])cylinder(r=m3/2,h=wall[2]+2,$fn=6);
         // end switch screw slots
         for(i=[0:1])translate([esl/2-m3/2,i*esd+esd/8,d1+m3nh])
            cube([m3,0.75*esd,wall[2]+1]);
         translate([esl/2,-xdist/2+xrod/2+wall[1]+0.5,0])cylinder(r1=0,r2=m3+1,h=d1+m3nh-0.01);
      }
         
      // belt channel 
      translate([-1,-xdist/2+xrod/2+wall[1],-1])
         cube([ml2+2,xdist-xrod-2*wall[1],xrod+2*wall[2]+m3nh+1]);
      translate([esl/2-m3/2,-motor_s/2,d1+m3nh-eh])
         cube([m3,motor_s,3*eh]);
   }
   // bridging support  
   if(support)color("red")hull(){
      translate([2,-2,0])cube([esl-4,4,1]);
      translate([-1,-ew/2,d1+m3nh-1])cube([esl+2,ew,1]);
   }

}
   
//  now build the desired part(s)

if(motorend)motorend();

if(endstop && !motorend)endstop();

if(idlerend)
   scale([-1,1,1])idlerend();
if(idler)
   translate([35,20,0])rotate(180)idler();

if(zcarriage && !motorend && !idlerend && !endstop &&!idler)zcarriage();

}

//////////////////////////////////////////////////////////////////////////////
///  Modules for automatic building of specific STL file via Makefile
//////////////////////////////////////////////////////////////////////////////

module motorxend(){ // AUTO_MAKE_STL
   i3_xend(motorend=true,idlerend=false,idler=false);
}

module motorxend_zendstop(){ // AUTO_MAKE_STL
   i3_xend(motorend=true,idlerend=false,idler=false,endstop=true);
}

module idlerxend(){ // AUTO_MAKE_STL
   i3_xend(motorend=false,idlerend=true,idler=false);
}

module idlerxend_xrodclamps(){ // AUTO_MAKE_STL
   i3_xend(motorend=false,idlerend=true,idler=false,idlerclamps=true);
}

module xendstop(){ // AUTO_MAKE_STL
   i3_xend(motorend=false,idlerend=false,idler=false,support=false,endstop=true);
}

module idler2x625(){ // AUTO_MAKE_STL
   i3_xend(motorend=false,idlerend=false,idler=true,bearing=[5,17,11]);
}

module idler2x686(){ // AUTO_MAKE_STL
   i3_xend(motorend=false,idlerend=false,idler=true,bearing=[6,16,11]);
}

module idler2x624(){ // AUTO_MAKE_STL
   i3_xend(motorend=false,idlerend=false,idler=true,bearing=[4,14,11]);
}

module idler2x623(){ // AUTO_MAKE_STL
   i3_xend(motorend=false,idlerend=false,idler=true,bearing=[3,11,9]);
}

module idler2x604(){ // AUTO_MAKE_STL
   i3_xend(motorend=false,idlerend=false,idler=true,bearing=[4,13,9]);
}

module idler608(){ // AUTO_MAKE_STL
   i3_xend(motorend=false,idlerend=false,idler=true,bearing=[8,18,8]);
}

module motorxend60_zendstop(){ // AUTO_MAKE_STL
   i3_xend(motorend=true,idlerend=false,idler=false,endstop=true,zclamps=false,xdist=60,ztrod=[6,10.2,5]);
}

module idlerxend60(){ // AUTO_MAKE_STL
   i3_xend(motorend=false,idlerend=true,idler=false,idlerclamps=false,zclamps=false,xdist=60,ztrod=[6,10.2,5]);
}

module idlerxend60_xrodclamps(){ // AUTO_MAKE_STL
   i3_xend(motorend=false,idlerend=true,idler=false,idlerclamps=true,zclamps=false,xdist=60,ztrod=[6,10.2,5]);
}

module xendstop60(){ // AUTO_MAKE_STL
   i3_xend(motorend=false,idlerend=false,idler=false,support=false,endstop=true,xdist=60);
}


//////////////////////////////////////////////////////////////////////////////
///  Uncomment as needed for manual printing
//////////////////////////////////////////////////////////////////////////////

//i3_xend(motorend=false,idlerend=true,idler=false,support=true,zcarriage=false,idlerclamps=true);
//scale([-1,1,1])i3_xend(motorend=false,idlerend=false,idler=false,support=false,zcarriage=true,idlerclamps=false);
//idlerxend();
motorxend();
//motorxend_zendstop();
//idlerxend_xrodclamps();
//motorxend60_zendstop();
//idlerxend60_xrodclamps();
//xendstop();
//idler2x625();
//idler2x623();
//idler2x604();
//idler608();
//
/// show all in print position:
//motorxend_zendstop();
//translate([55,0,0])xendstop();
//translate([120,0,0])idlerxend();
//translate([110,-45,0])rotate(180)idler2x604();
//
/// show all in working position:
//rotate(180)translate([30,90,0])
//{translate([-50,0,0])i3_xend(motorend=true,idlerend=false,idler=false,support=false,zcarriage=false);
//translate([85,0,0])i3_xend(motorend=false,idlerend=true,idler=false,support=false,zcarriage=false);
//i3_xend(motorend=false,idlerend=false,endstop=true,support=false,zcarriage=false);}
//translate([-50,0,0])i3_xend(motorend=true,idlerend=false,idler=false,support=false,zcarriage=false);
//translate([85,0,0])i3_xend(motorend=false,idlerend=true,idler=false,support=false,zcarriage=false);
//i3_xend(motorend=false,idlerend=false,endstop=true,support=false,zcarriage=false);
